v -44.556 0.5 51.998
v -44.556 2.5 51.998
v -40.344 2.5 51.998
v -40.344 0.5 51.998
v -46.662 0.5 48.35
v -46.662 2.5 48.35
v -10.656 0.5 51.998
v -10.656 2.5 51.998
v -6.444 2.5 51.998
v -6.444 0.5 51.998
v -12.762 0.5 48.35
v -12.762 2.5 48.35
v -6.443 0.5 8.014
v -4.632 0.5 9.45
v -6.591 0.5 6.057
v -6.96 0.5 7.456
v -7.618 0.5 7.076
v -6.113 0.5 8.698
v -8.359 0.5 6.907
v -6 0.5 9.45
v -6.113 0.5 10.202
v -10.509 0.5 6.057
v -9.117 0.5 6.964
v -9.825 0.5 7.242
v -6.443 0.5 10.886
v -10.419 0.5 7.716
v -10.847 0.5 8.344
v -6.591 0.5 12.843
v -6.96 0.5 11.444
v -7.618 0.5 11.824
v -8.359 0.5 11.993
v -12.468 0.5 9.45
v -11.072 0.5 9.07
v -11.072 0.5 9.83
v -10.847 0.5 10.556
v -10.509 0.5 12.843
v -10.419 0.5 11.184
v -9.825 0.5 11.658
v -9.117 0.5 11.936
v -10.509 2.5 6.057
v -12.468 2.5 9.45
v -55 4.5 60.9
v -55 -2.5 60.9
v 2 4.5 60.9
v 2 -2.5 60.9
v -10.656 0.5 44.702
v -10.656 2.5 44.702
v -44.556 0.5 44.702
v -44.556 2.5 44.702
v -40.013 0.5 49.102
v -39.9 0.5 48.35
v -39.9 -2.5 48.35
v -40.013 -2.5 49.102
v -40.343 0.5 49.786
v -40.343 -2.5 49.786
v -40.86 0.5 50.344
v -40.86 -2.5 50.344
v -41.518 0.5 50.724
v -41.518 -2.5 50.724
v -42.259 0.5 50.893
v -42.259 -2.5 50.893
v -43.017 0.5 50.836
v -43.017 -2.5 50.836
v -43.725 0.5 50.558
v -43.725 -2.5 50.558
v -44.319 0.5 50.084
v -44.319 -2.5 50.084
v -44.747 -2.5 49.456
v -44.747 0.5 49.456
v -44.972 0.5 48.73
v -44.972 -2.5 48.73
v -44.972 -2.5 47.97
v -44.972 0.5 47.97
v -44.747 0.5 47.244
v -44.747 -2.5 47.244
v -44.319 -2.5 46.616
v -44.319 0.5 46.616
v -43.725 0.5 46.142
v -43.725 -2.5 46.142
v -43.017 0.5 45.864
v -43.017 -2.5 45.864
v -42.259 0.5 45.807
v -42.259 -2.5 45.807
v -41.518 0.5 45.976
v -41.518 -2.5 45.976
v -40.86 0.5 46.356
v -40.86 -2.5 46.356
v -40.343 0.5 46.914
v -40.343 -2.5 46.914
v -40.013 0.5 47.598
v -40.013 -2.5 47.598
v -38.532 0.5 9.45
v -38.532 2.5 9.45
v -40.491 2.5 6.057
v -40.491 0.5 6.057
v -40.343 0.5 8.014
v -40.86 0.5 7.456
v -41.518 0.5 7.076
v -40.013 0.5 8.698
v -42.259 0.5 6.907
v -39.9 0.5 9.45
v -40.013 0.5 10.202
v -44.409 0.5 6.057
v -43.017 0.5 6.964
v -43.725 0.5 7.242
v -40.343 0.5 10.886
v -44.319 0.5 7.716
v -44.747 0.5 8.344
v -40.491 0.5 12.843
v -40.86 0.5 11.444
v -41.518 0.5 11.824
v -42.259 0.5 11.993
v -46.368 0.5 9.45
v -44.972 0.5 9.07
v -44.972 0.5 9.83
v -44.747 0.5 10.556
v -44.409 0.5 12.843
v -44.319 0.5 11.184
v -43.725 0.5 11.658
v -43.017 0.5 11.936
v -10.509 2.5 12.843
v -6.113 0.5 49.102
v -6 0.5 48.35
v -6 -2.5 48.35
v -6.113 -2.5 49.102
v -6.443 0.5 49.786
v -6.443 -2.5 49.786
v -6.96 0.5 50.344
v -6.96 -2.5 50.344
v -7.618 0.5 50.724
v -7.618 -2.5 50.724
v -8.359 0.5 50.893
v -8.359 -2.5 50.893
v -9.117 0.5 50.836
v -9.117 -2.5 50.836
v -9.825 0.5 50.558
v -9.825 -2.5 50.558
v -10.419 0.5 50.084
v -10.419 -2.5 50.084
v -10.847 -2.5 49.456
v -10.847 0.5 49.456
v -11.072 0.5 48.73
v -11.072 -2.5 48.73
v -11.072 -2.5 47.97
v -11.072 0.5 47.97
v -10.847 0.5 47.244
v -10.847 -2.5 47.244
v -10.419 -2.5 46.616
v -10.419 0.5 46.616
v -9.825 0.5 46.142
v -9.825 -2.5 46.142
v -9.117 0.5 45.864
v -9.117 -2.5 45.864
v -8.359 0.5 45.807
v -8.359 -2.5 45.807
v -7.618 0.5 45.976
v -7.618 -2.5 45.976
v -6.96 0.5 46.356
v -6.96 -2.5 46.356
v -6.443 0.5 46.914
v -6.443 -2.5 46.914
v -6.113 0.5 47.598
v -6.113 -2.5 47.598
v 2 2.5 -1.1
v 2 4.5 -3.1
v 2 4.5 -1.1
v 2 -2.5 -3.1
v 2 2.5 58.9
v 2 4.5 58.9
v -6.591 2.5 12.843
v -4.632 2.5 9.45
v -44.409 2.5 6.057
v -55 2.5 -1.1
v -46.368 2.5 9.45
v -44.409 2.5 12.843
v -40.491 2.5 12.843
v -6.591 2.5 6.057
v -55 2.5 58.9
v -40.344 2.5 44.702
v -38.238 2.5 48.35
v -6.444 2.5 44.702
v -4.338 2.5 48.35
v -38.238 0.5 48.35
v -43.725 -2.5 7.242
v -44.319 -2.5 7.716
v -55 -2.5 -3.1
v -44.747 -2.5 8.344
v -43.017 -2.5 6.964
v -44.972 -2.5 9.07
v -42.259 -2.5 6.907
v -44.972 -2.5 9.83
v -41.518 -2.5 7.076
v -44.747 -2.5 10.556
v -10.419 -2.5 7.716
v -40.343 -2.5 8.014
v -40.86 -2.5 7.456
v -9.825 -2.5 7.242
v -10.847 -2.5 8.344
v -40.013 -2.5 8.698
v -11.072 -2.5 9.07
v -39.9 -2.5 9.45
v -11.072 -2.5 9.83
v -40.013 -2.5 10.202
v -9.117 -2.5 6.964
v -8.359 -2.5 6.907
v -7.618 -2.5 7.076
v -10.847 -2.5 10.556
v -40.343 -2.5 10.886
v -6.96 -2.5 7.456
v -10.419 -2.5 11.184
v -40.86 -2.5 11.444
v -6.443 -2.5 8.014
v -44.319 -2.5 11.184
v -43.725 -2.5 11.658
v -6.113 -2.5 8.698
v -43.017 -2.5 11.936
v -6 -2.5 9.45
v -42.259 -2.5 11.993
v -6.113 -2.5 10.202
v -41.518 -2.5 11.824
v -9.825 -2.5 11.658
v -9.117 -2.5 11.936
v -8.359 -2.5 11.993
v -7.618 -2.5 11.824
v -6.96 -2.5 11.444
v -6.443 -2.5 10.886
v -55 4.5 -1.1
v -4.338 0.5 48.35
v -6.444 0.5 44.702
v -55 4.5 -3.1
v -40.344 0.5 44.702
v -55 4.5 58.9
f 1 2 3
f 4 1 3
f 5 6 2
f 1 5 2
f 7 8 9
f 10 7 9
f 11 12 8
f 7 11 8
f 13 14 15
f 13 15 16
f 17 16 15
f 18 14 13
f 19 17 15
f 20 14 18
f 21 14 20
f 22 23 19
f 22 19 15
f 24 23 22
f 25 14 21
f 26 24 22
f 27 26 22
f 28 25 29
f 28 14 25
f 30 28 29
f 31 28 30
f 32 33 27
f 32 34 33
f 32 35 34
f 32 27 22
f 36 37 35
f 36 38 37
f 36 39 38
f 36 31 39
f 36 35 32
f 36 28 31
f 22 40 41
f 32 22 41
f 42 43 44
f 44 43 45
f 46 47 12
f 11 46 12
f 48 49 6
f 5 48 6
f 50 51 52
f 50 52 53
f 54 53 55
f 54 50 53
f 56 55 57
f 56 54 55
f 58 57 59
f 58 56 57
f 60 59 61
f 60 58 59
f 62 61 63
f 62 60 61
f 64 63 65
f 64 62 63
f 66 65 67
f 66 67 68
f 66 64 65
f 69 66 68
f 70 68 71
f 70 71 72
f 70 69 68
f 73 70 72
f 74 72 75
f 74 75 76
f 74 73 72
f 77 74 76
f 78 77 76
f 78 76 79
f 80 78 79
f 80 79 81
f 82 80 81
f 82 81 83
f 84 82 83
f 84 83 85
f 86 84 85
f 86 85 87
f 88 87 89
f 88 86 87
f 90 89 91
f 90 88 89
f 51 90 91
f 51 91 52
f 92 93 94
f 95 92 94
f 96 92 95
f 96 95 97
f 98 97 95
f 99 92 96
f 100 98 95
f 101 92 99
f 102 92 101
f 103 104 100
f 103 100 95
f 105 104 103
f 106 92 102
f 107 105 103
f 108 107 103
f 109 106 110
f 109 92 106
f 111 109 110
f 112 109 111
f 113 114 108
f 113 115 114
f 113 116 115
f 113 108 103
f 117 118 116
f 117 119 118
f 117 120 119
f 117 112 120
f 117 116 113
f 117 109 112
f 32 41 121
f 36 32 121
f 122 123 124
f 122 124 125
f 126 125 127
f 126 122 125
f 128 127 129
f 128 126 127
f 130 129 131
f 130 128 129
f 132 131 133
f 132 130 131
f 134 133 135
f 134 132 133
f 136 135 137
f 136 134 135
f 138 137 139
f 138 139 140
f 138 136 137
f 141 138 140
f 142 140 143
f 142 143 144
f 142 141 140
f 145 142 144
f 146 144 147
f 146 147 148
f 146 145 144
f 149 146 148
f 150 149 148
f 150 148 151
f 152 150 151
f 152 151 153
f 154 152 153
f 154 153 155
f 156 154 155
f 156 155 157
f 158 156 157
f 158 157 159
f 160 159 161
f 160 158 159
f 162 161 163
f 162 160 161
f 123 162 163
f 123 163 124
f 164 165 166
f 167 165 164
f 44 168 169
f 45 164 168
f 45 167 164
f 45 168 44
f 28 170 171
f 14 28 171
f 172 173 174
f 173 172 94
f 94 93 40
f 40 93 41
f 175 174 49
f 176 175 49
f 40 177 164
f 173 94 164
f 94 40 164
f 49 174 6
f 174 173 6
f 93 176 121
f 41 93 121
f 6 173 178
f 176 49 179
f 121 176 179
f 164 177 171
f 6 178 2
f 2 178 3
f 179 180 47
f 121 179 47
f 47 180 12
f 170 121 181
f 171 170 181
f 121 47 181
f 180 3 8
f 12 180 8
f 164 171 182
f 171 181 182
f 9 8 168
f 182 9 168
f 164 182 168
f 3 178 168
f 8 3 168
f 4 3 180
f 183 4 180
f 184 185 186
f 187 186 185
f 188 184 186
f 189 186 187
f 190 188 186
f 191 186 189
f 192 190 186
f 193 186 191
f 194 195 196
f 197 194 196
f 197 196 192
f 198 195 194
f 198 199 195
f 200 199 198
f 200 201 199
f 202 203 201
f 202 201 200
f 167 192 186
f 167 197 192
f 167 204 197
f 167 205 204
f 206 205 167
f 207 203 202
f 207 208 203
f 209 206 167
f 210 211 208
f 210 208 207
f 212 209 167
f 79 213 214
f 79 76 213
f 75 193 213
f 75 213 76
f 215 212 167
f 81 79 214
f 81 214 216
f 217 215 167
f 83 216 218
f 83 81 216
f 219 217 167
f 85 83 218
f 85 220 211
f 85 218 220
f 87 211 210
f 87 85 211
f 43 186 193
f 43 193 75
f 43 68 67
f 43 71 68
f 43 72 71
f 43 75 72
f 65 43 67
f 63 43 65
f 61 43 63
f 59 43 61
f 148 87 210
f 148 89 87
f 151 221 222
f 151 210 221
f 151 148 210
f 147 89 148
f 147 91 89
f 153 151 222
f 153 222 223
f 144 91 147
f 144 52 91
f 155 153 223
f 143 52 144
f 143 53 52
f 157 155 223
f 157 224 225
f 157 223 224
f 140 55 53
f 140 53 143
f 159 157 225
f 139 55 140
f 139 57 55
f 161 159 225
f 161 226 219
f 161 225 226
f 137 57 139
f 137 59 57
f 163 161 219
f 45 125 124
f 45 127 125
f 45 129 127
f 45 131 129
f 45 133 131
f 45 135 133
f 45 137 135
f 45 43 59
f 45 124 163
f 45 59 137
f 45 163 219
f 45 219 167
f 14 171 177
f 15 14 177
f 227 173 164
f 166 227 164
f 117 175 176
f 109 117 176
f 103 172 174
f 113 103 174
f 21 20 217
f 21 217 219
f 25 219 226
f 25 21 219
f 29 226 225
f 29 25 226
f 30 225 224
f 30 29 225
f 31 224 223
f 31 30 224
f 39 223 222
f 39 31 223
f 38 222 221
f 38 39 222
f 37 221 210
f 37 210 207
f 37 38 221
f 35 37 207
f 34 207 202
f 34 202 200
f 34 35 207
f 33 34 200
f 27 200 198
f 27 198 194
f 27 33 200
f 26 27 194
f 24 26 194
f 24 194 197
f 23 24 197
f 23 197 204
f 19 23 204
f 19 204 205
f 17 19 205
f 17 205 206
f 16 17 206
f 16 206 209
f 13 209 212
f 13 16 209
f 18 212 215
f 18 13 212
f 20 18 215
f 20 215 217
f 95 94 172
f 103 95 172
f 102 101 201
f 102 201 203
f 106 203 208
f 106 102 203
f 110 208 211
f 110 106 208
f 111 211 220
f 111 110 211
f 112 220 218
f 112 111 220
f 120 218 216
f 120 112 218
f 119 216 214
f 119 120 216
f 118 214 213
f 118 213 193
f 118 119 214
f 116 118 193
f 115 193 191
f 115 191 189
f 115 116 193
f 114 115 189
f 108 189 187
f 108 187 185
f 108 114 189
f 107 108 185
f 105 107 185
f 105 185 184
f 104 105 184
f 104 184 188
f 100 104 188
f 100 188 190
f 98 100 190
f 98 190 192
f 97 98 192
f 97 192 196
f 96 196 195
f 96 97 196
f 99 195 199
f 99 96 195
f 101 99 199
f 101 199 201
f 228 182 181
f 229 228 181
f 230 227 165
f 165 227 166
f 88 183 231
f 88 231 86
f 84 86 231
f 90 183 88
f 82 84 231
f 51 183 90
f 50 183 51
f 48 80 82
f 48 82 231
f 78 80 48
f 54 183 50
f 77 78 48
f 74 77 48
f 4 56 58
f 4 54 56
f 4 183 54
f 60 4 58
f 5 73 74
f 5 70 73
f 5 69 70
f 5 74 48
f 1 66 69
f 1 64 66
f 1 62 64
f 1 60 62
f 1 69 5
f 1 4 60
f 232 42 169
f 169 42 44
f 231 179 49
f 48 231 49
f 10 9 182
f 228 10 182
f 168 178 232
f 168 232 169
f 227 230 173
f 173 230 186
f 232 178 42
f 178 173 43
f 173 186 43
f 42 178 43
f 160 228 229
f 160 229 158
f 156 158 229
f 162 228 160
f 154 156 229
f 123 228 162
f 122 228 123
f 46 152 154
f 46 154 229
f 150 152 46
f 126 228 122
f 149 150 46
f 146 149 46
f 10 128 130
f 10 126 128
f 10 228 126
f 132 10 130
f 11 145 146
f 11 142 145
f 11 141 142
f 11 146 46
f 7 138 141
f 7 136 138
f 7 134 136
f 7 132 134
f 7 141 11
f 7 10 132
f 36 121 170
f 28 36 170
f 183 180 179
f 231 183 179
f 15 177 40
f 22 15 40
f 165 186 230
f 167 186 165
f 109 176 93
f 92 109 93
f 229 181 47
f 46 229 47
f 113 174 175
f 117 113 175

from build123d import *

# Parameters (mm, degrees)
F0_W     = 57
F0_H     = 60
F0_R     = 2.55
F1_DEPTH = 2.5
F2_W     = 57
F2_H     = 2
F3_DEPTH = 7
F5_R     = 2.55
F6_DEPTH = 2


with BuildPart() as f1:
    # F0 (on Front) → F1 (new body, symmetric)
    with BuildSketch(Plane.XZ):
        with Locations((-26.5, 28.9)):
            Rectangle(F0_W, F0_H)
        with Locations((-42.45, 9.45)):
            Circle(F0_R, mode=Mode.SUBTRACT)
        with Locations((-8.55, 9.45)):
            Circle(F0_R, mode=Mode.SUBTRACT)
        with Locations((-42.45, 48.35)):
            Circle(F0_R, mode=Mode.SUBTRACT)
        with Locations((-8.55, 48.35)):
            Circle(F0_R, mode=Mode.SUBTRACT)
    extrude(amount=F1_DEPTH, both=True)

    # F2 (on face) → F3 (join)
    with BuildSketch(Plane.XZ.offset(2.5)):
        with Locations((-26.5, 59.9)):
            Rectangle(F2_W, F2_H)
        with Locations((-26.5, -2.1)):
            Rectangle(F2_W, F2_H)
    extrude(amount=-F3_DEPTH)

    # F5 (on face) → F6 (cut)
    with BuildSketch(Plane(origin=(0, 2.5, 0), x_dir=(-1, 0, 0), z_dir=(0, 1, 0))):
        Polygon((40.490779, 6.056529), (44.409221, 6.056529), (46.368442, 9.45), (44.409221, 12.843471), (40.490779, 12.843471), (38.531558, 9.45), align=None)
        with Locations((42.45, 9.45)):
            Circle(F5_R, mode=Mode.SUBTRACT)
        Polygon((6.590779, 6.056529), (10.509221, 6.056529), (12.468442, 9.45), (10.509221, 12.843471), (6.590779, 12.843471), (4.631558, 9.45), align=None)
        with Locations((8.55, 9.45)):
            Circle(F5_R, mode=Mode.SUBTRACT)
        Polygon((6.444065, 44.702414), (10.655935, 44.702414), (12.761869, 48.35), (10.655935, 51.997586), (6.444065, 51.997586), (4.338131, 48.35), align=None)
        with Locations((8.55, 48.35)):
            Circle(F5_R, mode=Mode.SUBTRACT)
        Polygon((40.344065, 44.702414), (44.555935, 44.702414), (46.661869, 48.35), (44.555935, 51.997586), (40.344065, 51.997586), (38.238131, 48.35), align=None)
        with Locations((42.45, 48.35)):
            Circle(F5_R, mode=Mode.SUBTRACT)
    extrude(amount=-F6_DEPTH, mode=Mode.SUBTRACT)


solid = f1.part
